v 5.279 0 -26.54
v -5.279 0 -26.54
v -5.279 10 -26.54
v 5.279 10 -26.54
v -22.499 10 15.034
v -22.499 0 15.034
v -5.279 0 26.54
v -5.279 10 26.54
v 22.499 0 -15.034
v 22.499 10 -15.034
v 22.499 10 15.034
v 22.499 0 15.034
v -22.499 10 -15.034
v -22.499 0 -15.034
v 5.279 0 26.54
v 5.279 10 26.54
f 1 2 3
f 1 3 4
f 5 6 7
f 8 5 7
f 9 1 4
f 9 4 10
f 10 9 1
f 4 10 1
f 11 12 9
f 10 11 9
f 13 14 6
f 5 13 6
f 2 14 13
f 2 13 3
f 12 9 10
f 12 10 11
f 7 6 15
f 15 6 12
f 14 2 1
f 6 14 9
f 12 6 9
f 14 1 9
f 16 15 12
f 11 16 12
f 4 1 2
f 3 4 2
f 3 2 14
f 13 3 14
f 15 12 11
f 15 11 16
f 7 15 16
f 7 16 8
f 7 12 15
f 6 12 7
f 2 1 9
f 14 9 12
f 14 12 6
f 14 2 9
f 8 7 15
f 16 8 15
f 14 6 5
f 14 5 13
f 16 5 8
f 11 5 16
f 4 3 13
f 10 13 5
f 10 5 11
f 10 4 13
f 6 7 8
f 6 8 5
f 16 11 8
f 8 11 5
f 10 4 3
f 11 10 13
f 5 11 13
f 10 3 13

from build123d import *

# Parameters (mm, degrees)
BOSS_EXTRUDE1_DEPTH   = 10
BODY_MOVE_COPY1_DEPTH = 10


# Read off the part's stored shape, not the designer's step: Body-Move/Copy1
with BuildPart() as part:
    # Sketch1 → Boss-Extrude1 (new body)
    with BuildSketch(Plane(origin=(0, 0, 0), x_dir=(1, 0, 0), z_dir=(0, 1, 0))):
        Polygon((5.279106073, 26.539858442), (22.499405578, 15.033622173), (22.499405578, -15.033622173), (5.279106073, -26.539858442), (-5.279106073, -26.539858442), (-22.499405578, -15.033622173), (-22.499405578, 15.033622173), (-5.279106073, 26.539858442), align=None)
    extrude(amount=BOSS_EXTRUDE1_DEPTH)


with BuildPart() as body_2:
    # Body-Move/Copy1 outline → Body-Move/Copy1 (new body)
    with BuildSketch(Plane(origin=(0, 0, 0), x_dir=(1, 0, 0), z_dir=(0, 1, 0))):
        Polygon((5.279106073, 26.539858442), (-5.279106073, 26.539858442), (-22.499405578, 15.033622173), (-22.499405578, -15.033622173), (-5.279106073, -26.539858442), (5.279106073, -26.539858442), (22.499405578, -15.033622173), (22.499405578, 15.033622173), align=None)
    extrude(amount=BODY_MOVE_COPY1_DEPTH)


solid = Compound([part.part, body_2.part])
